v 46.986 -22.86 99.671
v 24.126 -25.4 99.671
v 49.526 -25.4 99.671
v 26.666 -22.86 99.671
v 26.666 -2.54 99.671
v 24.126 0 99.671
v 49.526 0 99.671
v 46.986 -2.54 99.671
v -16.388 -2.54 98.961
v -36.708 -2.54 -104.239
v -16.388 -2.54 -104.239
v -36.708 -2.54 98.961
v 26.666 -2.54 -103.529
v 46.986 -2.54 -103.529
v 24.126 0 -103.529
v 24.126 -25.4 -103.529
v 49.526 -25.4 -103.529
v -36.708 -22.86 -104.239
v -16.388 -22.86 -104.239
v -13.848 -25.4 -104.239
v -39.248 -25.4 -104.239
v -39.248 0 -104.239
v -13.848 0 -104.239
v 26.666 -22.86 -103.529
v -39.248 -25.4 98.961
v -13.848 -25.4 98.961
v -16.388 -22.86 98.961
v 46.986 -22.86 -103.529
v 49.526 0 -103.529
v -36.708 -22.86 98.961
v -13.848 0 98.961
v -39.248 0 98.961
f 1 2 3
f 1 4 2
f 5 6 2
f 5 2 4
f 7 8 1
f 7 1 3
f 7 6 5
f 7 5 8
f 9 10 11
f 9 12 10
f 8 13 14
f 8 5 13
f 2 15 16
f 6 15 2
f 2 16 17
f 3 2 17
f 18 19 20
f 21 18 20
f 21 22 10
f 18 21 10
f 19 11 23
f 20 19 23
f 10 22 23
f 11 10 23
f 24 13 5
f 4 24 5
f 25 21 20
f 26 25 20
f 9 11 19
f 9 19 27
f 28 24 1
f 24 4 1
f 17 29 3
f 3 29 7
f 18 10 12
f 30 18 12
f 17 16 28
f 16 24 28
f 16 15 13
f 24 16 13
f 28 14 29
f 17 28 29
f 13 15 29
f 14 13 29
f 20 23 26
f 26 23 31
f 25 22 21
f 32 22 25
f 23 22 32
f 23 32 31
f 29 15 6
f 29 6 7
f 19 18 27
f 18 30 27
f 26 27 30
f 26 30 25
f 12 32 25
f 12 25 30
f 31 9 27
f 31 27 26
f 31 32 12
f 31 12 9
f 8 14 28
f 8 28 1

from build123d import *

# Parameters (mm, degrees)
F0_W     = 25.4
F0_H     = 203.2
F1_DEPTH = 25.4
F2_T     = -2.54
F2_2_T   = -2.54


with BuildPart() as f1:
    # F0 (on Front) → F1 (new body)
    with BuildSketch(Plane.XZ):
        with Locations((36.8255126894, -1.9285741091)):
            Rectangle(F0_W, F0_H)
    extrude(amount=F1_DEPTH)

    # F2#2
    f2_2_openings = [f1.faces().sort_by_distance(p)[0] for p in [
        (36.825513, -12.7, 99.671426),
        (36.825513, -12.7, -103.528574),
    ]]
    offset(amount=F2_2_T, openings=f2_2_openings)


with BuildPart() as f1b:
    # F0 (on Front) → F1, piece 2 (new body)
    with BuildSketch(Plane.XZ):
        with Locations((-26.5484208936, -2.6387274265)):
            Rectangle(F0_W, F0_H)
    extrude(amount=F1_DEPTH)

    # F2
    f2_openings = [f1b.faces().sort_by_distance(p)[0] for p in [
        (-26.548421, -12.7, 98.961273),
        (-26.548421, -12.7, -104.238727),
    ]]
    offset(amount=F2_T, openings=f2_openings)


solid = Compound([f1.part, f1b.part])
